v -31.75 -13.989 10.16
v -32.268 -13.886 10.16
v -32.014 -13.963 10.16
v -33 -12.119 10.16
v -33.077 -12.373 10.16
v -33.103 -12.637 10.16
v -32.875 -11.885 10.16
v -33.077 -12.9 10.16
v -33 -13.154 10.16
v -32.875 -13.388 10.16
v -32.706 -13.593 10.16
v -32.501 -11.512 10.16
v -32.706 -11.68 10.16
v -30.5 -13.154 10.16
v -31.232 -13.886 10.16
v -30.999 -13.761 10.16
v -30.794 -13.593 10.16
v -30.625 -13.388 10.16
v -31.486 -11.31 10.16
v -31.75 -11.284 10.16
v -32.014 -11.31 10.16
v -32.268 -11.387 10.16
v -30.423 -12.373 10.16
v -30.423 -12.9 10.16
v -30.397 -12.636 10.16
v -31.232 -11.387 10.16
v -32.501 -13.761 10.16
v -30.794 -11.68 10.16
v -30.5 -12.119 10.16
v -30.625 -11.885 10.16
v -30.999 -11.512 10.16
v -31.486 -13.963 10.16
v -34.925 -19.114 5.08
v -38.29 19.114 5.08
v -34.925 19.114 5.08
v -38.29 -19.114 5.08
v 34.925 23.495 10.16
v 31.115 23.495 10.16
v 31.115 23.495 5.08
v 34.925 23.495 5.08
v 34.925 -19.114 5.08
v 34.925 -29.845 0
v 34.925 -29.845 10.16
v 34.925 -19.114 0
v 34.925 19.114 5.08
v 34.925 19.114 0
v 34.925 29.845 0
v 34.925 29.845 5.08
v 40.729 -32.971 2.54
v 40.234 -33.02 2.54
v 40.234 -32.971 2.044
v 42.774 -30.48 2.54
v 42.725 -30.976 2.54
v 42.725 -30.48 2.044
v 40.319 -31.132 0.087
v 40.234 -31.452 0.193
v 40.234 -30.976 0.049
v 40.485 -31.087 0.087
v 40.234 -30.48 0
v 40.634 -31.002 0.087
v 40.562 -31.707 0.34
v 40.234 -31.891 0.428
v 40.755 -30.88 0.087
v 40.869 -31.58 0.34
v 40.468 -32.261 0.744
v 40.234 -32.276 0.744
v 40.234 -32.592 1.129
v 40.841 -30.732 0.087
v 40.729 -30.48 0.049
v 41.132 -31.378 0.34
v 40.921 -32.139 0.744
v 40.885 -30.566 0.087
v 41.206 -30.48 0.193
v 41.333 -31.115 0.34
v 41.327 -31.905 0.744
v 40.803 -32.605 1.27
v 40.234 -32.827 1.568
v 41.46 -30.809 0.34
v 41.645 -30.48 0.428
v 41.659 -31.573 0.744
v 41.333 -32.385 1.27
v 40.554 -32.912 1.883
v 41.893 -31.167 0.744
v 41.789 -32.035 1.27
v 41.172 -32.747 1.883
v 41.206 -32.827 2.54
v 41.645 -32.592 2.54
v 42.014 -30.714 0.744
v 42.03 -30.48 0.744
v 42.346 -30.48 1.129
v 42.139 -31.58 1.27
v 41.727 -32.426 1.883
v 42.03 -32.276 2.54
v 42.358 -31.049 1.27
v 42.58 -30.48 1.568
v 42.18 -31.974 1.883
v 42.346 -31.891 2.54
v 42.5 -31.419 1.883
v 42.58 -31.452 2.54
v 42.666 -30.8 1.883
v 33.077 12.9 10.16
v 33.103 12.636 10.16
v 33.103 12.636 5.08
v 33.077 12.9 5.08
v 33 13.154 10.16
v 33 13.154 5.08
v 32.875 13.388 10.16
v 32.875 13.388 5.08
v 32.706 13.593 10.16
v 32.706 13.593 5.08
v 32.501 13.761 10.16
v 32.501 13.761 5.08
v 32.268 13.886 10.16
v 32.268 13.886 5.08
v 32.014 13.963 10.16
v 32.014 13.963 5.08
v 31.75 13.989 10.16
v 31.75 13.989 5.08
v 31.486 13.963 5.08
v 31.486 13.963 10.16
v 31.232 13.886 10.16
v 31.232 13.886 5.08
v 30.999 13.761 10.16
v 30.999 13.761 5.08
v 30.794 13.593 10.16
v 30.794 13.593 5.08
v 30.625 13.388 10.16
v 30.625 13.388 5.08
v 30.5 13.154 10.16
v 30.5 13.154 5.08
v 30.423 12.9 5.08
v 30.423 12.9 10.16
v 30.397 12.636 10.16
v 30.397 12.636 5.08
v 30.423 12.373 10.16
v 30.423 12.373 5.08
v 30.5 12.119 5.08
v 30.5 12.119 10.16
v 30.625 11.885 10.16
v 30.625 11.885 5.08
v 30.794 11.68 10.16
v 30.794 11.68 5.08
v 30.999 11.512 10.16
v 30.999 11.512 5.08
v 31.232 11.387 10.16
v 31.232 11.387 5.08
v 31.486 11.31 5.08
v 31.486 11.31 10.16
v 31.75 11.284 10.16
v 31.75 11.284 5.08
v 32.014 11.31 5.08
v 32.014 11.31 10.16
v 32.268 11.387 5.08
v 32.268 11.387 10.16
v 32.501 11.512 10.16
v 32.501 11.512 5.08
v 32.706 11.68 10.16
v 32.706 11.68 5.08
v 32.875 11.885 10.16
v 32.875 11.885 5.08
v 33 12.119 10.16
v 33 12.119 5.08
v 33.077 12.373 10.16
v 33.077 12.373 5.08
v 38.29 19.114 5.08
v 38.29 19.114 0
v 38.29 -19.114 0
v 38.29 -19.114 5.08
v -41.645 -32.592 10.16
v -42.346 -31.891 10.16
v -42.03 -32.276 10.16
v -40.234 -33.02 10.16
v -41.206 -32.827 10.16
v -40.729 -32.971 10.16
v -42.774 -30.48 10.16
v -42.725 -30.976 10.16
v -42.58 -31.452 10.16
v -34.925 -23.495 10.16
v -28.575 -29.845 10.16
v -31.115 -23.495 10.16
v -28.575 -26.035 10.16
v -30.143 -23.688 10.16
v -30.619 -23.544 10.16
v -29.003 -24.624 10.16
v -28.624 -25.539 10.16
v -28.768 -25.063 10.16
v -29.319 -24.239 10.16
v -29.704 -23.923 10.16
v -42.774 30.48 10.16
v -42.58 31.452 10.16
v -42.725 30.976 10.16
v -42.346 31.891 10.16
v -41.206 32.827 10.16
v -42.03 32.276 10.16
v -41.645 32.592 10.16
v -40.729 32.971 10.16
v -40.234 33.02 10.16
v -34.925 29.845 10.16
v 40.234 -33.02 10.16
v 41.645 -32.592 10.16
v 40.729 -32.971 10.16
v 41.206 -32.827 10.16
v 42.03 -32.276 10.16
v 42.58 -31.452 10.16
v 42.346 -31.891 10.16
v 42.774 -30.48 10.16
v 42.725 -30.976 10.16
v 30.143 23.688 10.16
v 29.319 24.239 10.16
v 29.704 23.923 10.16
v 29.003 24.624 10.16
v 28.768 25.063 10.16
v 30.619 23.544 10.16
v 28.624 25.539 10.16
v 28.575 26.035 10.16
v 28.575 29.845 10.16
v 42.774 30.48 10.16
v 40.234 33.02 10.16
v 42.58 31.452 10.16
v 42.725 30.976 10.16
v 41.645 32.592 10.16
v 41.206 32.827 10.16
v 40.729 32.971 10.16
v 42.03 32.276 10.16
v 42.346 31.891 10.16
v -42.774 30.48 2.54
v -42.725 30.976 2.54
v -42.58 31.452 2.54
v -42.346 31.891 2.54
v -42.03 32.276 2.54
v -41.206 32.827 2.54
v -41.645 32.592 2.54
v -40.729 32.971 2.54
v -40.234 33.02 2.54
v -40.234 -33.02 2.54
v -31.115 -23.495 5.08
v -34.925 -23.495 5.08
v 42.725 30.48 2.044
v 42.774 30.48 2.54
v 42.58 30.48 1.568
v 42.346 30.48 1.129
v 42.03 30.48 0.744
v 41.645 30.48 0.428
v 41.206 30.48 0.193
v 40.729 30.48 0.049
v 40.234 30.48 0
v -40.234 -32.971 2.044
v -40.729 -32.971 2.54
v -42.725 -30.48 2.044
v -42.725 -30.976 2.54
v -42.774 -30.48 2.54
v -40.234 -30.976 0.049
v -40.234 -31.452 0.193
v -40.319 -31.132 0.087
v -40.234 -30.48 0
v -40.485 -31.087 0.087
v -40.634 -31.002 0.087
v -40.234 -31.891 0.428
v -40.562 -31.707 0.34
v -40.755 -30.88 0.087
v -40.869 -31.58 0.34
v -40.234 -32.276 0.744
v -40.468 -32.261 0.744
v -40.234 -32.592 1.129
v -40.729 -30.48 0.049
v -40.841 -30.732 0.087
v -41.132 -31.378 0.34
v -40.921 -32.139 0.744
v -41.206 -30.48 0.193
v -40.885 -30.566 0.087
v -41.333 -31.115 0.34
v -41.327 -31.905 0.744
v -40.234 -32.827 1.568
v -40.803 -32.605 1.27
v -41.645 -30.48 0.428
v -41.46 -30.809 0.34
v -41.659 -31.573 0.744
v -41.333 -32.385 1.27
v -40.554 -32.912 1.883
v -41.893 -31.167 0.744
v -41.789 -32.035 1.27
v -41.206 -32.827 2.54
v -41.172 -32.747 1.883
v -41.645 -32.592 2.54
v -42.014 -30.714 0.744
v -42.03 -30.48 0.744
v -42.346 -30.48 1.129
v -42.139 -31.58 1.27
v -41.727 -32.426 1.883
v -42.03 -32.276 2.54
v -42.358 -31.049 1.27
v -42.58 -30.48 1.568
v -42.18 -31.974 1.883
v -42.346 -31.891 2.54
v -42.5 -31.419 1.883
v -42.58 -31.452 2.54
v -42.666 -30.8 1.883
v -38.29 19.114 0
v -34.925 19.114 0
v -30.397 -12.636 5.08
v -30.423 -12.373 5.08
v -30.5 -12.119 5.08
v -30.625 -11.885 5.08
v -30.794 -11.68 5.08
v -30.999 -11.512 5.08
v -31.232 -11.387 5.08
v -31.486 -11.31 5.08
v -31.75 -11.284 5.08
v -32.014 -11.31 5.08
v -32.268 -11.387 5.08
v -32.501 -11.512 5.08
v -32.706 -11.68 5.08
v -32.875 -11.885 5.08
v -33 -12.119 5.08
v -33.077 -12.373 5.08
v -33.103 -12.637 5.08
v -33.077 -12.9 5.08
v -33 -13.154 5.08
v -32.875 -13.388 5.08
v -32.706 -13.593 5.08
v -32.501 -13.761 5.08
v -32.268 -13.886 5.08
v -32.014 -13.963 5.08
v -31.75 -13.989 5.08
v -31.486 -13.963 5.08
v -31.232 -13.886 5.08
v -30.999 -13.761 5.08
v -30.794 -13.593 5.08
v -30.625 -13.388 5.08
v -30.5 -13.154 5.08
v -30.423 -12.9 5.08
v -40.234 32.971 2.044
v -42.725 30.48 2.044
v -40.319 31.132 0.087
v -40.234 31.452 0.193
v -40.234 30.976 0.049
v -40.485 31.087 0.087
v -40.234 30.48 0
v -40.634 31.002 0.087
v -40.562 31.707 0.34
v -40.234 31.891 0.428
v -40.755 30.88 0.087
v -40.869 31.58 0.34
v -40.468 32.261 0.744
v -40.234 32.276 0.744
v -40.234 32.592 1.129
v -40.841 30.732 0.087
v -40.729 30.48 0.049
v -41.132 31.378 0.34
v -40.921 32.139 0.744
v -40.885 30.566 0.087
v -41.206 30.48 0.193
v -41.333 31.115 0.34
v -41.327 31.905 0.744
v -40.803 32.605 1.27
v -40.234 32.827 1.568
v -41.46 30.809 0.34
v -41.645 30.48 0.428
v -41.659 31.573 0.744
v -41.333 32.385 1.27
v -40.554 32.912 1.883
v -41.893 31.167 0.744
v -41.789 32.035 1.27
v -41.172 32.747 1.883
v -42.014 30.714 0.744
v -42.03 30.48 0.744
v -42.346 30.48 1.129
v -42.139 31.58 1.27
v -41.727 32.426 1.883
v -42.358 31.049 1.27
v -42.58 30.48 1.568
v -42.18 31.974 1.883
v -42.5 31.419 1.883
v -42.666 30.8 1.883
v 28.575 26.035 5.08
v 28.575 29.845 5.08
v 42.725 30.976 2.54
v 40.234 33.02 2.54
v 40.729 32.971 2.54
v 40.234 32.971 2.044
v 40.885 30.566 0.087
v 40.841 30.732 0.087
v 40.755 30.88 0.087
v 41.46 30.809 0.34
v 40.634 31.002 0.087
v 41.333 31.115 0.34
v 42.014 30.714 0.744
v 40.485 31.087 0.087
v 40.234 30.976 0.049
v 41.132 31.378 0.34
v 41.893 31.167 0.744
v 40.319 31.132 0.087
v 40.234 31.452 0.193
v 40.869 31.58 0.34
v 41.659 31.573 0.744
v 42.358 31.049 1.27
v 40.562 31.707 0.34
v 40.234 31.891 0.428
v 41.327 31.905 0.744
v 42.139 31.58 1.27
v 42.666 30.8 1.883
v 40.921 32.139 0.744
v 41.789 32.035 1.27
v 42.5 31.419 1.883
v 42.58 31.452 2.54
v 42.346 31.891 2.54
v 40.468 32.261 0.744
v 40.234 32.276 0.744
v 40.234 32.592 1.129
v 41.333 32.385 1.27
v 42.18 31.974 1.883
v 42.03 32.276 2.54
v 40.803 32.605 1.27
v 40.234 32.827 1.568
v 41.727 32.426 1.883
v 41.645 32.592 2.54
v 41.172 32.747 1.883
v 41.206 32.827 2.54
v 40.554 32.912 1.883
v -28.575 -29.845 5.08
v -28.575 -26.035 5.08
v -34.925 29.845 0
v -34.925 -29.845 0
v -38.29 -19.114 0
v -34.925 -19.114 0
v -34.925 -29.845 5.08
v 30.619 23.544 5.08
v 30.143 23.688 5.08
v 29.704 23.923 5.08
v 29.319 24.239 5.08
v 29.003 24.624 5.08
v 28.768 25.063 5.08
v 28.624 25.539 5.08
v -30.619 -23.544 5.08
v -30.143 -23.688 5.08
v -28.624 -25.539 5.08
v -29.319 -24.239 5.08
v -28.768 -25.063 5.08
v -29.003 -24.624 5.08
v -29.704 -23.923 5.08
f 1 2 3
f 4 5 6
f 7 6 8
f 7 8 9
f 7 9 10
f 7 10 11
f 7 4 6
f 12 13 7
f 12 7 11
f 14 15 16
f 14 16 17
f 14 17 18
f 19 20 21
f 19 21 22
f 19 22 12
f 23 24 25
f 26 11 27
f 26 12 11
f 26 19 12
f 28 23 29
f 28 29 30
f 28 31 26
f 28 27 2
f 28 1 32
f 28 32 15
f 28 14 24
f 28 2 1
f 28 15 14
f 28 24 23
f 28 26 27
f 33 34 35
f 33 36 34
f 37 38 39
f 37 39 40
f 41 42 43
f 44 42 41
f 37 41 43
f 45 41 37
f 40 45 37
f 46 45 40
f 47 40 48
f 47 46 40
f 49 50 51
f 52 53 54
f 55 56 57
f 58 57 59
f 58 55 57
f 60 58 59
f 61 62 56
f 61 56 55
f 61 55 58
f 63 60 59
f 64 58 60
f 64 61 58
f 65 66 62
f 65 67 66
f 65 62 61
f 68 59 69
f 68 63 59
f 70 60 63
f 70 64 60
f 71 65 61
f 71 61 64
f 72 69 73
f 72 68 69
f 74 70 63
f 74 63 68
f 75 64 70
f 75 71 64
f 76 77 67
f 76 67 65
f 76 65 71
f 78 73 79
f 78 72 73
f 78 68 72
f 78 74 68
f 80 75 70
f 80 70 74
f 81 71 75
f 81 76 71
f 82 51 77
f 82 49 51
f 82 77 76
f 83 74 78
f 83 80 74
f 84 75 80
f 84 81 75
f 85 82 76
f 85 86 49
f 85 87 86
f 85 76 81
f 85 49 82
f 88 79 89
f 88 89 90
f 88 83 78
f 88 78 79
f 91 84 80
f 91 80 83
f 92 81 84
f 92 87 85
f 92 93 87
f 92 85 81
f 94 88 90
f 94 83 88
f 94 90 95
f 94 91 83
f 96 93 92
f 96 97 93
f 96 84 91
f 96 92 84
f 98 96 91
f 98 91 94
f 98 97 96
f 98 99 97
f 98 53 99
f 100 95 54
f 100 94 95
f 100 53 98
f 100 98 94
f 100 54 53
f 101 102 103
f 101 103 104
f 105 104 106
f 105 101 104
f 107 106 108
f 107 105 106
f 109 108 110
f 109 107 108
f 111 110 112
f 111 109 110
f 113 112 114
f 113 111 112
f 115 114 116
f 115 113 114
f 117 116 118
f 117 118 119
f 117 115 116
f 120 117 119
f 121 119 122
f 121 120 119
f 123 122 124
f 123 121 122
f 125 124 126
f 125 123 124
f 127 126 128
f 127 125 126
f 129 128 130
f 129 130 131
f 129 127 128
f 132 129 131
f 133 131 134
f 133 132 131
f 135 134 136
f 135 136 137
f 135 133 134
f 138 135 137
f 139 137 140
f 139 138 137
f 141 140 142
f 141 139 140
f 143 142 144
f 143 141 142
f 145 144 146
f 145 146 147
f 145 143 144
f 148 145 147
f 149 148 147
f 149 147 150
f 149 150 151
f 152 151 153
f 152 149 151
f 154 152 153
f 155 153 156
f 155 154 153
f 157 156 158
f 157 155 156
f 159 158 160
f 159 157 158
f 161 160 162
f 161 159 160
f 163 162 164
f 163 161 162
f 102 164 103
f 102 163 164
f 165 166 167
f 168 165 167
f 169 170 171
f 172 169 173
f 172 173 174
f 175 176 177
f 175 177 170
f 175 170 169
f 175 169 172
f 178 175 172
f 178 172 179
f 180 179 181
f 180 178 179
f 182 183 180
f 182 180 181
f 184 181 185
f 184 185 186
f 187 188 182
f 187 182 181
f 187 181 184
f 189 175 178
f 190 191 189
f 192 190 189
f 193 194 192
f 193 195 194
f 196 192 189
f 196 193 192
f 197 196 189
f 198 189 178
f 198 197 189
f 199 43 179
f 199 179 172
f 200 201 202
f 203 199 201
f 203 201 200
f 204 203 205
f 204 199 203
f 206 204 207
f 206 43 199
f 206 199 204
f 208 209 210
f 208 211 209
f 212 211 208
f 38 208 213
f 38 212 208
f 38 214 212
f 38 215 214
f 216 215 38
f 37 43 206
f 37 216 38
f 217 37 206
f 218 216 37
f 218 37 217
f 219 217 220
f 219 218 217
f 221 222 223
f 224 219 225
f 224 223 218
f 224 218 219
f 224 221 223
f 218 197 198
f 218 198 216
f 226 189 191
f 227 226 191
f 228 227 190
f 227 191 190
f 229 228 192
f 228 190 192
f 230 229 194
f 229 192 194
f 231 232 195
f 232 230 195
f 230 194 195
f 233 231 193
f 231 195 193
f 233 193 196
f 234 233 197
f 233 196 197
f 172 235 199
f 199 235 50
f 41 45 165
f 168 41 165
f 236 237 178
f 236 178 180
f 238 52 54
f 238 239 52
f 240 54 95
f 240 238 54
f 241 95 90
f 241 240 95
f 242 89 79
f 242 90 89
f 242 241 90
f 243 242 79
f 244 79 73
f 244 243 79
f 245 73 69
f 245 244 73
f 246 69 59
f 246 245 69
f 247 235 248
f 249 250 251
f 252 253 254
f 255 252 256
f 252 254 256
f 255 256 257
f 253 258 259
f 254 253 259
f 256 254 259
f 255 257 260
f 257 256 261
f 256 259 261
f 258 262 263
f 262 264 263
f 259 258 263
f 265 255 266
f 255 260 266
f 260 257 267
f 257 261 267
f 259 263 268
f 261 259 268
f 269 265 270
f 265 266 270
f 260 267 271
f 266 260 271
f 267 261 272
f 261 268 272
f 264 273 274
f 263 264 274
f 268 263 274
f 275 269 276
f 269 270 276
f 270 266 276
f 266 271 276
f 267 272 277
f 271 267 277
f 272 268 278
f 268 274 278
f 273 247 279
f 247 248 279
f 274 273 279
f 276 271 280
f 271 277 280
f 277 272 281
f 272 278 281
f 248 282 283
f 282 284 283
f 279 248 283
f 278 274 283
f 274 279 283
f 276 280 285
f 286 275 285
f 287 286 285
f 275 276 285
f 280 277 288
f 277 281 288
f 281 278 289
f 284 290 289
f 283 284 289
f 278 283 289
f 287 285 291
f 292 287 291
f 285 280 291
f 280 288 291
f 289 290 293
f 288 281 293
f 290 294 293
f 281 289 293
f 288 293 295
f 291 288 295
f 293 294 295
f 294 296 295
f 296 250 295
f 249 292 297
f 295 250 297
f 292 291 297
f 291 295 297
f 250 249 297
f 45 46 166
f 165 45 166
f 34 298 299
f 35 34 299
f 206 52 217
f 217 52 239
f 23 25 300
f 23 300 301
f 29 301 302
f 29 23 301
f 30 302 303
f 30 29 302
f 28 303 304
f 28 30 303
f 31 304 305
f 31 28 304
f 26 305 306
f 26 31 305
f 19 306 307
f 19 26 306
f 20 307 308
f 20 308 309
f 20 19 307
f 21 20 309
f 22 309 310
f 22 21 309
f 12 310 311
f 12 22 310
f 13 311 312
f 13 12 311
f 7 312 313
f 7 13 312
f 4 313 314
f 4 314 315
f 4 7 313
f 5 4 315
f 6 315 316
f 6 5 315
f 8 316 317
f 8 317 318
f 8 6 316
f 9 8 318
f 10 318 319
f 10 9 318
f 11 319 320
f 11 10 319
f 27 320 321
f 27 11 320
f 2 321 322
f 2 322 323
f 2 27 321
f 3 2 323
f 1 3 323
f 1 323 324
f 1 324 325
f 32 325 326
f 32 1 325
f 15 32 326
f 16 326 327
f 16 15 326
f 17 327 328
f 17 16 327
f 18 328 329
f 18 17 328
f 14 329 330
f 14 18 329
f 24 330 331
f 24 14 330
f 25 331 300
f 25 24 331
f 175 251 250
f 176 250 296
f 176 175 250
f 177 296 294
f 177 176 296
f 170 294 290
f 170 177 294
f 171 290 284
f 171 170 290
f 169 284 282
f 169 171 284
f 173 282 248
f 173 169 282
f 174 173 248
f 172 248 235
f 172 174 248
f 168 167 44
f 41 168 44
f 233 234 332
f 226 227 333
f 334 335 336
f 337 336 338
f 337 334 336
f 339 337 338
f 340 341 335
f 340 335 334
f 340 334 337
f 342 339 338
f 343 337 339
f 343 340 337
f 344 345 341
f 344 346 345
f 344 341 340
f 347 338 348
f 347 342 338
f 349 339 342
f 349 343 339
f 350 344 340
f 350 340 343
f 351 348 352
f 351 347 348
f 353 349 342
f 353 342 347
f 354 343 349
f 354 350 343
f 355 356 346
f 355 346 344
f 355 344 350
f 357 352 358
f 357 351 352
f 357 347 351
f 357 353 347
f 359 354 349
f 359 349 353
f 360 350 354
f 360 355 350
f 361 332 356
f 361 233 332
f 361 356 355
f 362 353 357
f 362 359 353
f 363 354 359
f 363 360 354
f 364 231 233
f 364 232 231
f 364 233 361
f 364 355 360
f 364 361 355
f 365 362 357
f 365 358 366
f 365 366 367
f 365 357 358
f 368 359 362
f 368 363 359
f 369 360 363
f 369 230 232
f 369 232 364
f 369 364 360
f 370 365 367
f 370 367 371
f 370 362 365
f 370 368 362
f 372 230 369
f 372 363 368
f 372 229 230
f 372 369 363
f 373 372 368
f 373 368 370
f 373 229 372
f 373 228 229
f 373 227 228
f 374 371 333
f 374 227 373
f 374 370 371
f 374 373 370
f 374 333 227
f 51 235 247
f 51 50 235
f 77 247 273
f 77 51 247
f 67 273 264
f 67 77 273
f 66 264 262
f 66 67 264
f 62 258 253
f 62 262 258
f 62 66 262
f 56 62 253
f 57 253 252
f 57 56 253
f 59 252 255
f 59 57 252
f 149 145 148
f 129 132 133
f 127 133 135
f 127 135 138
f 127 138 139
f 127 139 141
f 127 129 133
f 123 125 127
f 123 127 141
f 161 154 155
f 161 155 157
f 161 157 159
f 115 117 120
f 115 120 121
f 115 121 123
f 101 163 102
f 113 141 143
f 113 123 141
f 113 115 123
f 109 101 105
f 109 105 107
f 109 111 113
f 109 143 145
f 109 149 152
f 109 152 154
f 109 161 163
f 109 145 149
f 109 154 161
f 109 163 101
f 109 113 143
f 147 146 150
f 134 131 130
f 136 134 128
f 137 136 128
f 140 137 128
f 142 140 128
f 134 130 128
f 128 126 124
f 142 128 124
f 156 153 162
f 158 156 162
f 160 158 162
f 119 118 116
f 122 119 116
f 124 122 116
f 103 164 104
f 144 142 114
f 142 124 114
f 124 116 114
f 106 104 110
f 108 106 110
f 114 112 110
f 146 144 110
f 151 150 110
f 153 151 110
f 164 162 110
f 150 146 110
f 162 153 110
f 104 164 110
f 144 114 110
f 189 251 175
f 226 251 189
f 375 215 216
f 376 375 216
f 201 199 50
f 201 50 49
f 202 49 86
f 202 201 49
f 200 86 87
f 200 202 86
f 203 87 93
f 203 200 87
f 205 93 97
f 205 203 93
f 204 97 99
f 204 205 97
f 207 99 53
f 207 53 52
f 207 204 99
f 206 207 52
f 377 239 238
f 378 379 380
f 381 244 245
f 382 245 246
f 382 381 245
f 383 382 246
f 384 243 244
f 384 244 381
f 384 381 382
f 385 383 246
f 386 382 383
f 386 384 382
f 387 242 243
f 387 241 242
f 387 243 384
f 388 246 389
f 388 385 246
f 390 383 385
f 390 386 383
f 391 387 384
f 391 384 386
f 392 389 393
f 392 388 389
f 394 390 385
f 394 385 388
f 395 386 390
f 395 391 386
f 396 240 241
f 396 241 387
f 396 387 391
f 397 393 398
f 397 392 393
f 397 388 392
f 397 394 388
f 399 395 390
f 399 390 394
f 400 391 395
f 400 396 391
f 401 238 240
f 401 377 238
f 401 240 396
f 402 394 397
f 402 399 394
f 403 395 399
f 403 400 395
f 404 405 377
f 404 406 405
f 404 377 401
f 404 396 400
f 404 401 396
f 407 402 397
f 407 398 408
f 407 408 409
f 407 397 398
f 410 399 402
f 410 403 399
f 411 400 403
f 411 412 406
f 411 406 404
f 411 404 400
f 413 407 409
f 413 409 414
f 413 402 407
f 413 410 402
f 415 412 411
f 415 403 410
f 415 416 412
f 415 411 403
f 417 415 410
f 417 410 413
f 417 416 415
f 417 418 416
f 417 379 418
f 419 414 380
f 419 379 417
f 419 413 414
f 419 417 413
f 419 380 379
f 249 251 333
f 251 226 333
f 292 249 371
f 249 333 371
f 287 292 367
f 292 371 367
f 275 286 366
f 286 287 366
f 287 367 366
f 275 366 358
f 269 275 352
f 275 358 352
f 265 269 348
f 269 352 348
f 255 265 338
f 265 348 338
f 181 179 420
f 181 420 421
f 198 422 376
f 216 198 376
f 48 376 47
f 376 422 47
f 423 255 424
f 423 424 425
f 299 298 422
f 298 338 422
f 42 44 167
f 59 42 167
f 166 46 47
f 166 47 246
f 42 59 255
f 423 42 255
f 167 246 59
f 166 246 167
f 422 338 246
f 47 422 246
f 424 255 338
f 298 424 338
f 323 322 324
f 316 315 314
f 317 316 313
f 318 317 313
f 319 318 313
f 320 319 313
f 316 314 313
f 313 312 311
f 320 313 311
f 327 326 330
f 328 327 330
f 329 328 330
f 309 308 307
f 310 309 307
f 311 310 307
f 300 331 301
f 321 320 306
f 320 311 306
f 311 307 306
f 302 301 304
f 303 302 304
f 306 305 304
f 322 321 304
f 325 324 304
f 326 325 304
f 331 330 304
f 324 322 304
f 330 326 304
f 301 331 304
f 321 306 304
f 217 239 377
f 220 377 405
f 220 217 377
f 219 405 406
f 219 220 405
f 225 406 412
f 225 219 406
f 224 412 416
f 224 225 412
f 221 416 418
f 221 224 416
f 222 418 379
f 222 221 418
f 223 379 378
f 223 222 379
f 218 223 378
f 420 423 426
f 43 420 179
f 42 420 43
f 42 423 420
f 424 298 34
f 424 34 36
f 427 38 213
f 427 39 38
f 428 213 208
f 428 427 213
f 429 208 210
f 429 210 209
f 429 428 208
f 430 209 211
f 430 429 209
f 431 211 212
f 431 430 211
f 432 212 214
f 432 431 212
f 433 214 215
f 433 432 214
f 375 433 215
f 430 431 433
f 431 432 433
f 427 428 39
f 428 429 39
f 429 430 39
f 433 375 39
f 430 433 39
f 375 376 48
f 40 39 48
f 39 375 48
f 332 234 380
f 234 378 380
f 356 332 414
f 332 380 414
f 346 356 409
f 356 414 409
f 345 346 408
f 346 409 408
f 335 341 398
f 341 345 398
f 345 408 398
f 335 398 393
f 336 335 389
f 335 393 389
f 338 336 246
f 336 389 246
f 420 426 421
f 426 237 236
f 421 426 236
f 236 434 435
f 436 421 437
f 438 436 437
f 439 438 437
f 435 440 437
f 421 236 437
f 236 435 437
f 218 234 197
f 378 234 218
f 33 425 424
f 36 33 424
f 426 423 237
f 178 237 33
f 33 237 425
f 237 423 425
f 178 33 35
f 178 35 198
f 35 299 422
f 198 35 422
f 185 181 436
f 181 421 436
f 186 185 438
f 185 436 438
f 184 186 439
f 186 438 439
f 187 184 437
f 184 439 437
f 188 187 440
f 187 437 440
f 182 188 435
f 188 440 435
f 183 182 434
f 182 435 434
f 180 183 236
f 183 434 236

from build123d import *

# Parameters (mm, degrees)
F0_W     = 85.5472
F0_H     = 66.04
F0_W_2   = 69.85
F0_H_2   = 59.69
F1_DEPTH = 10.16
F2_W     = 6.35
F2_H     = 6.35
F3_DEPTH = 5.08
F2_R     = 1.35255
F4_R     = 2.54
F5_W     = 3.3655
F5_H     = 38.227
F5_W_2   = 69.85
F6_DEPTH = 5.08
F7_R     = 2.54


with BuildPart() as f1:
    # F0 (on Top) → F1 (new body)
    with BuildSketch(Plane.XY):
        Rectangle(F0_W, F0_H)
        Rectangle(F0_W_2, F0_H_2, mode=Mode.SUBTRACT)
    extrude(amount=F1_DEPTH)

    # F2 (on face) → F3 (join)
    with BuildSketch(Plane.XY.offset(10.16)):
        with Locations((-31.75, -26.67)):
            Rectangle(F2_W, F2_H)
        with Locations((31.75, 26.67)):
            Rectangle(F2_W, F2_H)
    extrude(amount=-F3_DEPTH)

    # F4
    f4_edges = [f1.edges().sort_by_distance(p)[0] for p in [
        (28.575, 23.495, 7.62),
        (-28.575, -23.495, 7.62),
    ]]
    fillet(f4_edges, radius=F4_R)

    # F5 (on face) → F6 (cut)
    with BuildSketch(Plane(origin=(0, 0, 0), x_dir=(1, 0, 0), z_dir=(0, 0, -1))):
        with Locations((36.60775, 0)):
            Rectangle(F5_W, F5_H)
        Rectangle(F5_W_2, F5_H)
        with Locations((-36.60775, 0)):
            Rectangle(F5_W, F5_H)
    extrude(amount=-F6_DEPTH, mode=Mode.SUBTRACT)

    # F7
    f7_edges = [f1.edges().sort_by_distance(p)[0] for p in [
        (42.7736, -33.02, 5.08),
        (42.7736, 33.02, 5.08),
        (-42.7736, -33.02, 5.08),
        (-42.7736, 33.02, 5.08),
        (0, -33.02, 0),
        (42.7736, 0, 0),
        (0, 33.02, 0),
        (-42.7736, 0, 0),
    ]]
    fillet(f7_edges, radius=F7_R)


with BuildPart() as f3:
    # F2 (on face) → F3, piece 2 (new body)
    with BuildSketch(Plane.XY.offset(10.16)):
        with Locations((-31.75, -12.6365)):
            Circle(F2_R)
    extrude(amount=-F3_DEPTH)


with BuildPart() as f3b:
    # F2 (on face) → F3, piece 3 (new body)
    with BuildSketch(Plane.XY.offset(10.16)):
        with Locations((31.75, 12.6365)):
            Circle(F2_R)
    extrude(amount=-F3_DEPTH)


solid = Compound([f1.part, f3.part, f3b.part])
